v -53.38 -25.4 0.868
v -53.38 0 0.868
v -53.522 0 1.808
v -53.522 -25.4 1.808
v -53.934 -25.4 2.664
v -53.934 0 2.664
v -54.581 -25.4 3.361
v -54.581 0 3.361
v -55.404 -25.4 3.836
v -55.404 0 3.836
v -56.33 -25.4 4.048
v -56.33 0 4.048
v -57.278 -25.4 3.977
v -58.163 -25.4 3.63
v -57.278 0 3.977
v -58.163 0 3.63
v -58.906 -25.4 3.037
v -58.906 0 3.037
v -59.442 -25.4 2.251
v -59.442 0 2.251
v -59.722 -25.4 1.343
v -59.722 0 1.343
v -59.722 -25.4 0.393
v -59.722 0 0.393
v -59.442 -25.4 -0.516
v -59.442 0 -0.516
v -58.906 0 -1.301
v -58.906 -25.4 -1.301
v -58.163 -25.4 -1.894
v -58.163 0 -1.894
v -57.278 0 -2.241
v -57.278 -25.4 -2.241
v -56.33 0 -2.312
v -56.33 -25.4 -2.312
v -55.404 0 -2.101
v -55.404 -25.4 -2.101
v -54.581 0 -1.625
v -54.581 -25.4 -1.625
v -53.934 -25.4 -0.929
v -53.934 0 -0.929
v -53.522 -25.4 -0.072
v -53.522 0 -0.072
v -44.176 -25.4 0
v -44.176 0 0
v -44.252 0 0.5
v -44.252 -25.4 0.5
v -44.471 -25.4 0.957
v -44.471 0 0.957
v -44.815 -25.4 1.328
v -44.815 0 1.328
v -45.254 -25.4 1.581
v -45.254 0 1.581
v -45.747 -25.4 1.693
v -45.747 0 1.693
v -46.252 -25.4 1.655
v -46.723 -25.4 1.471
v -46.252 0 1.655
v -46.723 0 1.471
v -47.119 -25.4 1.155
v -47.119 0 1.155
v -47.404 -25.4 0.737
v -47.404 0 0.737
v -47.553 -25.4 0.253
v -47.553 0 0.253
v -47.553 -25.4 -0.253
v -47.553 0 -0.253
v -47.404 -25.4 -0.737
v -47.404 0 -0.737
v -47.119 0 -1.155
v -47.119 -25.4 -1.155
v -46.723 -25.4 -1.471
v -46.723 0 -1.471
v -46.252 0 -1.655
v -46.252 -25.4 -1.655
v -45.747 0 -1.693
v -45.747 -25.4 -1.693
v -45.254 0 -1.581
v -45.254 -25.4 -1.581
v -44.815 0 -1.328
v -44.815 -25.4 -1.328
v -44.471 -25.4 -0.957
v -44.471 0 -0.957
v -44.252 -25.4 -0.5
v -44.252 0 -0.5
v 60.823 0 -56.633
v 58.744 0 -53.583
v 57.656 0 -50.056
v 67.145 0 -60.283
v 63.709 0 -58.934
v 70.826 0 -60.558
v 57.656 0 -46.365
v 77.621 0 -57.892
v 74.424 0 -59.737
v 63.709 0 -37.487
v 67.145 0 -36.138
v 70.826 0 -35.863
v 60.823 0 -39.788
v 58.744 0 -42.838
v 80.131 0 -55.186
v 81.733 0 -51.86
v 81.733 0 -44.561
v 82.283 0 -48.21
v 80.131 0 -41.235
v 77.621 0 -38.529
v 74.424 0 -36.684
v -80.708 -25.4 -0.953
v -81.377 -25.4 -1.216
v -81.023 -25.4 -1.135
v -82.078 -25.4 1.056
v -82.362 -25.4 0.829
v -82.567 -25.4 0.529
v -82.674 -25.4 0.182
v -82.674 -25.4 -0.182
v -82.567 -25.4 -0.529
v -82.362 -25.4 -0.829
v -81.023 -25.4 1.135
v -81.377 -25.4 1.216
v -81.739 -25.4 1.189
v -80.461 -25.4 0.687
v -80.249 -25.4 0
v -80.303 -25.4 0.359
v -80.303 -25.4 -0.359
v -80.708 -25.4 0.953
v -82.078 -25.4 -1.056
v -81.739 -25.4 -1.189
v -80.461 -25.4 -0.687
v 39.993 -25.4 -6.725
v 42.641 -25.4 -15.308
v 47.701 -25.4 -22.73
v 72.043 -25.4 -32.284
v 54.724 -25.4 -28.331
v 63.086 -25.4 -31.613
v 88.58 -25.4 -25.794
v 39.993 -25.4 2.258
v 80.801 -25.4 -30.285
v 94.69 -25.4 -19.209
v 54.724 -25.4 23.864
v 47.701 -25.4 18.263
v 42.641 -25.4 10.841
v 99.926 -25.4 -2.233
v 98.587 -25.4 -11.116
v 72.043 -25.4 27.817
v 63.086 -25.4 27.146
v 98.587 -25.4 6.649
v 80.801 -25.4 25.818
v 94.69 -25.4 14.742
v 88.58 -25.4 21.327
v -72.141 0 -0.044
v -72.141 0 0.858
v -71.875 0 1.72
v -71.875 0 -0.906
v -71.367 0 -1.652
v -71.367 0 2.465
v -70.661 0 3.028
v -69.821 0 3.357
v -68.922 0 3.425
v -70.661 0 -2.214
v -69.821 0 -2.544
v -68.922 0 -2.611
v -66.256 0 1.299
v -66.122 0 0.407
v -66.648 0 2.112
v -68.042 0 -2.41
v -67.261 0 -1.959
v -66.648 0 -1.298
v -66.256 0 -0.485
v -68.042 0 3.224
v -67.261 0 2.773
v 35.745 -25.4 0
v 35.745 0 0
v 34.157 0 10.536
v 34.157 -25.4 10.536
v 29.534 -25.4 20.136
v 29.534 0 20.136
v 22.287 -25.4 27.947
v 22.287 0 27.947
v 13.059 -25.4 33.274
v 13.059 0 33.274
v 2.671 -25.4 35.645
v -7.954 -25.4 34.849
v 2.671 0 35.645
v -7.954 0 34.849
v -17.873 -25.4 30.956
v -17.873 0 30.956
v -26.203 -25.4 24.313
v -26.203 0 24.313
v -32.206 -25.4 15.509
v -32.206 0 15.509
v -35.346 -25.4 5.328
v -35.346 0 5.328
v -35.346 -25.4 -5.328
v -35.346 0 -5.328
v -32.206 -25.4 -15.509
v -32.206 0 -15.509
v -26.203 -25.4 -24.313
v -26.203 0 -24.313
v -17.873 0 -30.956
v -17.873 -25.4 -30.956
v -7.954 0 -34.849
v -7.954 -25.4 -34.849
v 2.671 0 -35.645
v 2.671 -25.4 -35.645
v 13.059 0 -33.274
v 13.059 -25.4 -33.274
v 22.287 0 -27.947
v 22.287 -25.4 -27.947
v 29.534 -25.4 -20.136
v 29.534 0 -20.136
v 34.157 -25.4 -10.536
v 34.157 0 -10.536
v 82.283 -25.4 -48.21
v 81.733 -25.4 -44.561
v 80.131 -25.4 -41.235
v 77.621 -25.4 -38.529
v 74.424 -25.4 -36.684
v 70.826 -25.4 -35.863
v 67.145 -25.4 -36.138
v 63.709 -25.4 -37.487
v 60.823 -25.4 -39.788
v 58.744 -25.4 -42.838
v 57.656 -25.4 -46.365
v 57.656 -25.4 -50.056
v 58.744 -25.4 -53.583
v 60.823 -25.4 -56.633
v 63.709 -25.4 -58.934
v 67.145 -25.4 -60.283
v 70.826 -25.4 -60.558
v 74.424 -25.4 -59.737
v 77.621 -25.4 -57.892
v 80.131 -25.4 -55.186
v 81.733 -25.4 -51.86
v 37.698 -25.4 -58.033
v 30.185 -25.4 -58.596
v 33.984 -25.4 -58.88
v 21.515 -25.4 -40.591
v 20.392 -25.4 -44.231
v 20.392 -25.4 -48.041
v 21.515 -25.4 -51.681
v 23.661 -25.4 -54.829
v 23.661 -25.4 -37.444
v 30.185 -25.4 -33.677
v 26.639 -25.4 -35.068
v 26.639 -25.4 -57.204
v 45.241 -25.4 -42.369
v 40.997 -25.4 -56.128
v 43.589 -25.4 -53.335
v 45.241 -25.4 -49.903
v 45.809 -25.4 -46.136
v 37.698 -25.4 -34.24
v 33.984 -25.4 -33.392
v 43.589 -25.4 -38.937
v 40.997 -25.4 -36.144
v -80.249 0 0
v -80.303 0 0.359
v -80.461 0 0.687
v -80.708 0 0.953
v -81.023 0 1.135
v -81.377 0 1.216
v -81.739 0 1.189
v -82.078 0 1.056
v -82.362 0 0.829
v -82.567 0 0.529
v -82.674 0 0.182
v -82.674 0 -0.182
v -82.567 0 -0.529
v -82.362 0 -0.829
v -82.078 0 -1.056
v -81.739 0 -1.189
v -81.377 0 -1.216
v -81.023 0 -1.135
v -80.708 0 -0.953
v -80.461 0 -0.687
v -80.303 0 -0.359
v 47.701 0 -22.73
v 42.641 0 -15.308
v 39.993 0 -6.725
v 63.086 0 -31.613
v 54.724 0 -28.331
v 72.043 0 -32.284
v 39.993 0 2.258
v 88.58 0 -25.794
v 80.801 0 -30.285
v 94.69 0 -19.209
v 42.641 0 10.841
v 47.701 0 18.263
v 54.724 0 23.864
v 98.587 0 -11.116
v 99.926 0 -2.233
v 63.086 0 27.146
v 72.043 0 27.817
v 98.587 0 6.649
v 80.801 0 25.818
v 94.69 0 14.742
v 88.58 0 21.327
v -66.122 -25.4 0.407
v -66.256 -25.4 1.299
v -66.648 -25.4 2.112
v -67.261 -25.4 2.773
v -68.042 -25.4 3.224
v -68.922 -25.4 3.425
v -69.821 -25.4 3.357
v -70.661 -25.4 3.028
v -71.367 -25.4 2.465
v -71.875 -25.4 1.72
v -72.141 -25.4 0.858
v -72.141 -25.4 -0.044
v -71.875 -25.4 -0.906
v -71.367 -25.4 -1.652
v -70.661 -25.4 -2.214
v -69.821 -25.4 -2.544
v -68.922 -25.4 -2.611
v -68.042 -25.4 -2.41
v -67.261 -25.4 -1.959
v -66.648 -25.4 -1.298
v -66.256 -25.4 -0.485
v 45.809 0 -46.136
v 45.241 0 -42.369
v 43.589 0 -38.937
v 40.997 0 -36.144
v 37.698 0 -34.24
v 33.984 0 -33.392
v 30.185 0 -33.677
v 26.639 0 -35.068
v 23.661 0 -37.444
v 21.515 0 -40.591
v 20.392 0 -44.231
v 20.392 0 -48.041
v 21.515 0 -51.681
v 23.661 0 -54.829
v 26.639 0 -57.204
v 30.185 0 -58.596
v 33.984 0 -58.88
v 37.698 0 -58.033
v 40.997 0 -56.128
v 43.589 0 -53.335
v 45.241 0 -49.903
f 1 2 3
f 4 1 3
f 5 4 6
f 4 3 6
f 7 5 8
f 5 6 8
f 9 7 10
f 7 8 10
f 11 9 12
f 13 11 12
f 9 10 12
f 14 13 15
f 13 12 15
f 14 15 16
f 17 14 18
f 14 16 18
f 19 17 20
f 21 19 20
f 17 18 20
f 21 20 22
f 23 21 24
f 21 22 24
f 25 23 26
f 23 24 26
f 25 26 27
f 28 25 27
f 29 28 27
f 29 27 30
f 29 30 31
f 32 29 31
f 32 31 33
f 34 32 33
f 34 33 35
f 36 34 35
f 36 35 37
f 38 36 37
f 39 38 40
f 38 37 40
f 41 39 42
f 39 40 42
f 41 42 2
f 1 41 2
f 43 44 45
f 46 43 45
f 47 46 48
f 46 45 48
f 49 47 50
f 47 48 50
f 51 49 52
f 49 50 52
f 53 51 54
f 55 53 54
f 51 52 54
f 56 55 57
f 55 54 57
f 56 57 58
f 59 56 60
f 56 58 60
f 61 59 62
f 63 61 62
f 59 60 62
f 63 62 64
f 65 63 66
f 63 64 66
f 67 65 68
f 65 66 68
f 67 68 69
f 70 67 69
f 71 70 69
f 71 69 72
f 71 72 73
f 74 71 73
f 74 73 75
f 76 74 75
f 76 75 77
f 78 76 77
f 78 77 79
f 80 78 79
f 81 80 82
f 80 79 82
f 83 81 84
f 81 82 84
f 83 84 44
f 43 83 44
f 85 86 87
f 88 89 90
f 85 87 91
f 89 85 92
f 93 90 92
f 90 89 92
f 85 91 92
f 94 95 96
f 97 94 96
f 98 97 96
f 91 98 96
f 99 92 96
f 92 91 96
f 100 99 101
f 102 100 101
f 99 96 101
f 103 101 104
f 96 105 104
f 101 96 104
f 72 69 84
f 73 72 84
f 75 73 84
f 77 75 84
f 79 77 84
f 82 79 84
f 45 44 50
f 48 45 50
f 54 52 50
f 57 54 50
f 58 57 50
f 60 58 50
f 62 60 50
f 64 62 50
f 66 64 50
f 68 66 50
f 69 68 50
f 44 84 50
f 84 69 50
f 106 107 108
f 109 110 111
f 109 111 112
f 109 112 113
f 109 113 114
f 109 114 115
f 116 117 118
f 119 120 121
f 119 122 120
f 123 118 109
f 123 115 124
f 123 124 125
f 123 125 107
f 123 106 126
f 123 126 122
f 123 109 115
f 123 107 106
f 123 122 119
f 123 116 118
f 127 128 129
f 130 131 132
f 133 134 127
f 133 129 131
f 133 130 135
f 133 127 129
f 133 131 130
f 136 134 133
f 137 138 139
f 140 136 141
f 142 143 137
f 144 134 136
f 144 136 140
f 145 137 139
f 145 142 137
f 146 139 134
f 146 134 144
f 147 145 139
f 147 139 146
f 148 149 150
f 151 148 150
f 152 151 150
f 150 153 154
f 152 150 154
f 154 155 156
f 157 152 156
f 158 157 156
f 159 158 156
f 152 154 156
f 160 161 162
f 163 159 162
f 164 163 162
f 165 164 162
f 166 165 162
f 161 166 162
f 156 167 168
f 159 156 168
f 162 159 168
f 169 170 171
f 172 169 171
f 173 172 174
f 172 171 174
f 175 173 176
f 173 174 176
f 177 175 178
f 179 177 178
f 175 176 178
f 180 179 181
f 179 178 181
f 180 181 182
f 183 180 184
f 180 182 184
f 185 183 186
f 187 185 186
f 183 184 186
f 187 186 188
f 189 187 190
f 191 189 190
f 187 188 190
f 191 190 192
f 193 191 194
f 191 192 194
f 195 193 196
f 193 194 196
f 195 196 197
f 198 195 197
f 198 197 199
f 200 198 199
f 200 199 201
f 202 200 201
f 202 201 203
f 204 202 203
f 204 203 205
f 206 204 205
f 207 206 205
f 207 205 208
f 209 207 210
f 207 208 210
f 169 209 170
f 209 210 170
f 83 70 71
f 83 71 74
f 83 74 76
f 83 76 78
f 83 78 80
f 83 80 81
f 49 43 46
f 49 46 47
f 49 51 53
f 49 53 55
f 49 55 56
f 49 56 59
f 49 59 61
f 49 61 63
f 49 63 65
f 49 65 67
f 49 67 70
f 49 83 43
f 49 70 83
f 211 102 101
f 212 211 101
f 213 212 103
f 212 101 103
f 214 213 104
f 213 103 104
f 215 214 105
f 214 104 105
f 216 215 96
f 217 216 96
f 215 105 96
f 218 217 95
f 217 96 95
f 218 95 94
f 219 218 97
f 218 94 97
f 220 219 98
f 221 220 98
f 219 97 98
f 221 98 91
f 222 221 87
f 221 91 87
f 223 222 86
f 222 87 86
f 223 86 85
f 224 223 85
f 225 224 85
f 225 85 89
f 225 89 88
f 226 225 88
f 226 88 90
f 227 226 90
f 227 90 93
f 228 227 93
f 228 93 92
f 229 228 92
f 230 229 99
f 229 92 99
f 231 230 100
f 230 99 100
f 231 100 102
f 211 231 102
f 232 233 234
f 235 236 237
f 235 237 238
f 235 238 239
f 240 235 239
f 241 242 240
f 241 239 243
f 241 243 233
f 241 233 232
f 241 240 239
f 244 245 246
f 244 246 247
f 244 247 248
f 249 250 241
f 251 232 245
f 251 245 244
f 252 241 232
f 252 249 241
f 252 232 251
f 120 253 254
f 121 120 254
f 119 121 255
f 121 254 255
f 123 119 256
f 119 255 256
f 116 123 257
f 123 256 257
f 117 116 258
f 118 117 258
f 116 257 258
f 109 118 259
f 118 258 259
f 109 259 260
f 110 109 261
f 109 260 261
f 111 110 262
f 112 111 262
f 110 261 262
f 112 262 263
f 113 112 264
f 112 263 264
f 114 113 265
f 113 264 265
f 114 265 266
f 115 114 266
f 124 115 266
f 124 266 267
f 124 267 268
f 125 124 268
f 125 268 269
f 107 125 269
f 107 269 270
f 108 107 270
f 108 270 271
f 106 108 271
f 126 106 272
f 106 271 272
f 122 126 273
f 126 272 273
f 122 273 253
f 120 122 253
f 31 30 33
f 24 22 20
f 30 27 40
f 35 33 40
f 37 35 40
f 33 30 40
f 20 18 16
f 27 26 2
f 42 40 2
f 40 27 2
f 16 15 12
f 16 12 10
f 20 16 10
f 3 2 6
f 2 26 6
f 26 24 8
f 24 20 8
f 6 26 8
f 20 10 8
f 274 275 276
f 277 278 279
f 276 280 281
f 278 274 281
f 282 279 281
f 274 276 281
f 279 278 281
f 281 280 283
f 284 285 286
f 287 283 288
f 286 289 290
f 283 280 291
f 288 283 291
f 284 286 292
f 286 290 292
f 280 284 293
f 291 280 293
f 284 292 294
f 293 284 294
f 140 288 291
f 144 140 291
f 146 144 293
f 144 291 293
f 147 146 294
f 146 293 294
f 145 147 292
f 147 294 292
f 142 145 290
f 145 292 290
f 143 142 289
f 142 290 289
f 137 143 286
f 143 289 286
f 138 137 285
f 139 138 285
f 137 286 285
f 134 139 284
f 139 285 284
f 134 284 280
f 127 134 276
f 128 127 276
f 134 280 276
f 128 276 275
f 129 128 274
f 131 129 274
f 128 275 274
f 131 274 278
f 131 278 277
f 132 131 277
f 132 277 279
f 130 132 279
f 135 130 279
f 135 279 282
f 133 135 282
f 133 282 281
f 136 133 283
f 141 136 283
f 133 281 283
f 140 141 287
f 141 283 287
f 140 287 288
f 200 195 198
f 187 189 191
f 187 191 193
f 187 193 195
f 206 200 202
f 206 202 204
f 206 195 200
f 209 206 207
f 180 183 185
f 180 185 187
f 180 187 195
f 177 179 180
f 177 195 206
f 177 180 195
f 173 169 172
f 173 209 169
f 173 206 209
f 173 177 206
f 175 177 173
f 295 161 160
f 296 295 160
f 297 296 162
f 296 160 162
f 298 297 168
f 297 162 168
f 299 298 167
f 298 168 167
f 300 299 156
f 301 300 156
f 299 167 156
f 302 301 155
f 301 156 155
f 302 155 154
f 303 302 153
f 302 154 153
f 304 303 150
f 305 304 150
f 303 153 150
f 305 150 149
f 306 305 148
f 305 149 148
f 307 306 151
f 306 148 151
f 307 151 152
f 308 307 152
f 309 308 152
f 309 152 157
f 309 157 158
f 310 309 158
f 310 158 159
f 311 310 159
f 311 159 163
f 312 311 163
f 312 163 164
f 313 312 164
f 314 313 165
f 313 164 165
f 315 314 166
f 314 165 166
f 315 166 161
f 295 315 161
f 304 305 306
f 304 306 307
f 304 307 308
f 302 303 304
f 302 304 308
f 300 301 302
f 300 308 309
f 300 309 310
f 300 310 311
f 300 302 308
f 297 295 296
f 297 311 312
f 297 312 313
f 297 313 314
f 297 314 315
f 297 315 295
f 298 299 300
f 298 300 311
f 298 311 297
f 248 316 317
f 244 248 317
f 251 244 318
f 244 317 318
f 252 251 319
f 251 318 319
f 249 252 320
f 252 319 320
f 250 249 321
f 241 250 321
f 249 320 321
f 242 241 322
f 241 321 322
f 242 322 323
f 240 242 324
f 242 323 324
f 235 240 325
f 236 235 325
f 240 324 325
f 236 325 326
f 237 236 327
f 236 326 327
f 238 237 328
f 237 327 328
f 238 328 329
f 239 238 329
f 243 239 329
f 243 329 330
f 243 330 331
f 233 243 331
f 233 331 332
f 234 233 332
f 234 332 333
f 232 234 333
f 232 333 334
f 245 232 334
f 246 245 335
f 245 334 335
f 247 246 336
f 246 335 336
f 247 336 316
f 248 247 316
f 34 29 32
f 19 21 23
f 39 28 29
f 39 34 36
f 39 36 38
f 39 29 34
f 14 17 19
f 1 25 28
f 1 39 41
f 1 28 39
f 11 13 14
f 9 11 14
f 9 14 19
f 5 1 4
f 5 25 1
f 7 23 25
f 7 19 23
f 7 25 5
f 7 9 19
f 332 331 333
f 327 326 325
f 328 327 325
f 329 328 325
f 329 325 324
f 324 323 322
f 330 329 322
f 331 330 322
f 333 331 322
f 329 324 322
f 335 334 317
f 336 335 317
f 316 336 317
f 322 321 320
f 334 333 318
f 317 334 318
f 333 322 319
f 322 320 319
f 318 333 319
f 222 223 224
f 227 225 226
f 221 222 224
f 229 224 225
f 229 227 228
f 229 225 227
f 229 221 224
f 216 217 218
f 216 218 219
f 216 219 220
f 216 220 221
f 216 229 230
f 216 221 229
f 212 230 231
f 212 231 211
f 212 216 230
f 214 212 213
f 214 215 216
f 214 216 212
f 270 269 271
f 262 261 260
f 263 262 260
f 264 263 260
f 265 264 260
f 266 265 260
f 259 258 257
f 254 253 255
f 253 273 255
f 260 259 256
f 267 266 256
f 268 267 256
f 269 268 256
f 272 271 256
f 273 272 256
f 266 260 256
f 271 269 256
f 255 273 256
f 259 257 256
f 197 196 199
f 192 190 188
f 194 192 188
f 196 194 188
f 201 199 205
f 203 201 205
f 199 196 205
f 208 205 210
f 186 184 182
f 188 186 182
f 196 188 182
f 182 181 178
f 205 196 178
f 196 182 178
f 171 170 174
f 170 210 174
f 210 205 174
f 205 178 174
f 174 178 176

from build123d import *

# Parameters (mm, degrees)
F0_R     = 1.2192
F0_R_2   = 3.02641
F0_R_3   = 3.18897
F0_R_4   = 1.69799
F0_R_5   = 35.74542
F0_R_6   = 30.13456
F0_R_7   = 12.78001
F0_R_8   = 12.3825
F1_DEPTH = 25.4


with BuildPart() as f1:
    # F0 (on Front) → F1 (new body)
    with BuildSketch(Plane.XZ):
        with Locations((-81.468083, 0)):
            Circle(F0_R)
        with Locations((-69.148049, 0.406844)):
            Circle(F0_R_2)
        with Locations((-56.56881, 0.867844)):
            Circle(F0_R_3)
        with Locations((-45.874156, 0)):
            Circle(F0_R_4)
        Circle(F0_R_5)
        with Locations((69.791469, -2.23349)):
            Circle(F0_R_6)
        with Locations((33.029166, -46.136162)):
            Circle(F0_R_7)
        with Locations((69.900196, -48.210488)):
            Circle(F0_R_8)
    extrude(amount=F1_DEPTH)


solid = f1.part
